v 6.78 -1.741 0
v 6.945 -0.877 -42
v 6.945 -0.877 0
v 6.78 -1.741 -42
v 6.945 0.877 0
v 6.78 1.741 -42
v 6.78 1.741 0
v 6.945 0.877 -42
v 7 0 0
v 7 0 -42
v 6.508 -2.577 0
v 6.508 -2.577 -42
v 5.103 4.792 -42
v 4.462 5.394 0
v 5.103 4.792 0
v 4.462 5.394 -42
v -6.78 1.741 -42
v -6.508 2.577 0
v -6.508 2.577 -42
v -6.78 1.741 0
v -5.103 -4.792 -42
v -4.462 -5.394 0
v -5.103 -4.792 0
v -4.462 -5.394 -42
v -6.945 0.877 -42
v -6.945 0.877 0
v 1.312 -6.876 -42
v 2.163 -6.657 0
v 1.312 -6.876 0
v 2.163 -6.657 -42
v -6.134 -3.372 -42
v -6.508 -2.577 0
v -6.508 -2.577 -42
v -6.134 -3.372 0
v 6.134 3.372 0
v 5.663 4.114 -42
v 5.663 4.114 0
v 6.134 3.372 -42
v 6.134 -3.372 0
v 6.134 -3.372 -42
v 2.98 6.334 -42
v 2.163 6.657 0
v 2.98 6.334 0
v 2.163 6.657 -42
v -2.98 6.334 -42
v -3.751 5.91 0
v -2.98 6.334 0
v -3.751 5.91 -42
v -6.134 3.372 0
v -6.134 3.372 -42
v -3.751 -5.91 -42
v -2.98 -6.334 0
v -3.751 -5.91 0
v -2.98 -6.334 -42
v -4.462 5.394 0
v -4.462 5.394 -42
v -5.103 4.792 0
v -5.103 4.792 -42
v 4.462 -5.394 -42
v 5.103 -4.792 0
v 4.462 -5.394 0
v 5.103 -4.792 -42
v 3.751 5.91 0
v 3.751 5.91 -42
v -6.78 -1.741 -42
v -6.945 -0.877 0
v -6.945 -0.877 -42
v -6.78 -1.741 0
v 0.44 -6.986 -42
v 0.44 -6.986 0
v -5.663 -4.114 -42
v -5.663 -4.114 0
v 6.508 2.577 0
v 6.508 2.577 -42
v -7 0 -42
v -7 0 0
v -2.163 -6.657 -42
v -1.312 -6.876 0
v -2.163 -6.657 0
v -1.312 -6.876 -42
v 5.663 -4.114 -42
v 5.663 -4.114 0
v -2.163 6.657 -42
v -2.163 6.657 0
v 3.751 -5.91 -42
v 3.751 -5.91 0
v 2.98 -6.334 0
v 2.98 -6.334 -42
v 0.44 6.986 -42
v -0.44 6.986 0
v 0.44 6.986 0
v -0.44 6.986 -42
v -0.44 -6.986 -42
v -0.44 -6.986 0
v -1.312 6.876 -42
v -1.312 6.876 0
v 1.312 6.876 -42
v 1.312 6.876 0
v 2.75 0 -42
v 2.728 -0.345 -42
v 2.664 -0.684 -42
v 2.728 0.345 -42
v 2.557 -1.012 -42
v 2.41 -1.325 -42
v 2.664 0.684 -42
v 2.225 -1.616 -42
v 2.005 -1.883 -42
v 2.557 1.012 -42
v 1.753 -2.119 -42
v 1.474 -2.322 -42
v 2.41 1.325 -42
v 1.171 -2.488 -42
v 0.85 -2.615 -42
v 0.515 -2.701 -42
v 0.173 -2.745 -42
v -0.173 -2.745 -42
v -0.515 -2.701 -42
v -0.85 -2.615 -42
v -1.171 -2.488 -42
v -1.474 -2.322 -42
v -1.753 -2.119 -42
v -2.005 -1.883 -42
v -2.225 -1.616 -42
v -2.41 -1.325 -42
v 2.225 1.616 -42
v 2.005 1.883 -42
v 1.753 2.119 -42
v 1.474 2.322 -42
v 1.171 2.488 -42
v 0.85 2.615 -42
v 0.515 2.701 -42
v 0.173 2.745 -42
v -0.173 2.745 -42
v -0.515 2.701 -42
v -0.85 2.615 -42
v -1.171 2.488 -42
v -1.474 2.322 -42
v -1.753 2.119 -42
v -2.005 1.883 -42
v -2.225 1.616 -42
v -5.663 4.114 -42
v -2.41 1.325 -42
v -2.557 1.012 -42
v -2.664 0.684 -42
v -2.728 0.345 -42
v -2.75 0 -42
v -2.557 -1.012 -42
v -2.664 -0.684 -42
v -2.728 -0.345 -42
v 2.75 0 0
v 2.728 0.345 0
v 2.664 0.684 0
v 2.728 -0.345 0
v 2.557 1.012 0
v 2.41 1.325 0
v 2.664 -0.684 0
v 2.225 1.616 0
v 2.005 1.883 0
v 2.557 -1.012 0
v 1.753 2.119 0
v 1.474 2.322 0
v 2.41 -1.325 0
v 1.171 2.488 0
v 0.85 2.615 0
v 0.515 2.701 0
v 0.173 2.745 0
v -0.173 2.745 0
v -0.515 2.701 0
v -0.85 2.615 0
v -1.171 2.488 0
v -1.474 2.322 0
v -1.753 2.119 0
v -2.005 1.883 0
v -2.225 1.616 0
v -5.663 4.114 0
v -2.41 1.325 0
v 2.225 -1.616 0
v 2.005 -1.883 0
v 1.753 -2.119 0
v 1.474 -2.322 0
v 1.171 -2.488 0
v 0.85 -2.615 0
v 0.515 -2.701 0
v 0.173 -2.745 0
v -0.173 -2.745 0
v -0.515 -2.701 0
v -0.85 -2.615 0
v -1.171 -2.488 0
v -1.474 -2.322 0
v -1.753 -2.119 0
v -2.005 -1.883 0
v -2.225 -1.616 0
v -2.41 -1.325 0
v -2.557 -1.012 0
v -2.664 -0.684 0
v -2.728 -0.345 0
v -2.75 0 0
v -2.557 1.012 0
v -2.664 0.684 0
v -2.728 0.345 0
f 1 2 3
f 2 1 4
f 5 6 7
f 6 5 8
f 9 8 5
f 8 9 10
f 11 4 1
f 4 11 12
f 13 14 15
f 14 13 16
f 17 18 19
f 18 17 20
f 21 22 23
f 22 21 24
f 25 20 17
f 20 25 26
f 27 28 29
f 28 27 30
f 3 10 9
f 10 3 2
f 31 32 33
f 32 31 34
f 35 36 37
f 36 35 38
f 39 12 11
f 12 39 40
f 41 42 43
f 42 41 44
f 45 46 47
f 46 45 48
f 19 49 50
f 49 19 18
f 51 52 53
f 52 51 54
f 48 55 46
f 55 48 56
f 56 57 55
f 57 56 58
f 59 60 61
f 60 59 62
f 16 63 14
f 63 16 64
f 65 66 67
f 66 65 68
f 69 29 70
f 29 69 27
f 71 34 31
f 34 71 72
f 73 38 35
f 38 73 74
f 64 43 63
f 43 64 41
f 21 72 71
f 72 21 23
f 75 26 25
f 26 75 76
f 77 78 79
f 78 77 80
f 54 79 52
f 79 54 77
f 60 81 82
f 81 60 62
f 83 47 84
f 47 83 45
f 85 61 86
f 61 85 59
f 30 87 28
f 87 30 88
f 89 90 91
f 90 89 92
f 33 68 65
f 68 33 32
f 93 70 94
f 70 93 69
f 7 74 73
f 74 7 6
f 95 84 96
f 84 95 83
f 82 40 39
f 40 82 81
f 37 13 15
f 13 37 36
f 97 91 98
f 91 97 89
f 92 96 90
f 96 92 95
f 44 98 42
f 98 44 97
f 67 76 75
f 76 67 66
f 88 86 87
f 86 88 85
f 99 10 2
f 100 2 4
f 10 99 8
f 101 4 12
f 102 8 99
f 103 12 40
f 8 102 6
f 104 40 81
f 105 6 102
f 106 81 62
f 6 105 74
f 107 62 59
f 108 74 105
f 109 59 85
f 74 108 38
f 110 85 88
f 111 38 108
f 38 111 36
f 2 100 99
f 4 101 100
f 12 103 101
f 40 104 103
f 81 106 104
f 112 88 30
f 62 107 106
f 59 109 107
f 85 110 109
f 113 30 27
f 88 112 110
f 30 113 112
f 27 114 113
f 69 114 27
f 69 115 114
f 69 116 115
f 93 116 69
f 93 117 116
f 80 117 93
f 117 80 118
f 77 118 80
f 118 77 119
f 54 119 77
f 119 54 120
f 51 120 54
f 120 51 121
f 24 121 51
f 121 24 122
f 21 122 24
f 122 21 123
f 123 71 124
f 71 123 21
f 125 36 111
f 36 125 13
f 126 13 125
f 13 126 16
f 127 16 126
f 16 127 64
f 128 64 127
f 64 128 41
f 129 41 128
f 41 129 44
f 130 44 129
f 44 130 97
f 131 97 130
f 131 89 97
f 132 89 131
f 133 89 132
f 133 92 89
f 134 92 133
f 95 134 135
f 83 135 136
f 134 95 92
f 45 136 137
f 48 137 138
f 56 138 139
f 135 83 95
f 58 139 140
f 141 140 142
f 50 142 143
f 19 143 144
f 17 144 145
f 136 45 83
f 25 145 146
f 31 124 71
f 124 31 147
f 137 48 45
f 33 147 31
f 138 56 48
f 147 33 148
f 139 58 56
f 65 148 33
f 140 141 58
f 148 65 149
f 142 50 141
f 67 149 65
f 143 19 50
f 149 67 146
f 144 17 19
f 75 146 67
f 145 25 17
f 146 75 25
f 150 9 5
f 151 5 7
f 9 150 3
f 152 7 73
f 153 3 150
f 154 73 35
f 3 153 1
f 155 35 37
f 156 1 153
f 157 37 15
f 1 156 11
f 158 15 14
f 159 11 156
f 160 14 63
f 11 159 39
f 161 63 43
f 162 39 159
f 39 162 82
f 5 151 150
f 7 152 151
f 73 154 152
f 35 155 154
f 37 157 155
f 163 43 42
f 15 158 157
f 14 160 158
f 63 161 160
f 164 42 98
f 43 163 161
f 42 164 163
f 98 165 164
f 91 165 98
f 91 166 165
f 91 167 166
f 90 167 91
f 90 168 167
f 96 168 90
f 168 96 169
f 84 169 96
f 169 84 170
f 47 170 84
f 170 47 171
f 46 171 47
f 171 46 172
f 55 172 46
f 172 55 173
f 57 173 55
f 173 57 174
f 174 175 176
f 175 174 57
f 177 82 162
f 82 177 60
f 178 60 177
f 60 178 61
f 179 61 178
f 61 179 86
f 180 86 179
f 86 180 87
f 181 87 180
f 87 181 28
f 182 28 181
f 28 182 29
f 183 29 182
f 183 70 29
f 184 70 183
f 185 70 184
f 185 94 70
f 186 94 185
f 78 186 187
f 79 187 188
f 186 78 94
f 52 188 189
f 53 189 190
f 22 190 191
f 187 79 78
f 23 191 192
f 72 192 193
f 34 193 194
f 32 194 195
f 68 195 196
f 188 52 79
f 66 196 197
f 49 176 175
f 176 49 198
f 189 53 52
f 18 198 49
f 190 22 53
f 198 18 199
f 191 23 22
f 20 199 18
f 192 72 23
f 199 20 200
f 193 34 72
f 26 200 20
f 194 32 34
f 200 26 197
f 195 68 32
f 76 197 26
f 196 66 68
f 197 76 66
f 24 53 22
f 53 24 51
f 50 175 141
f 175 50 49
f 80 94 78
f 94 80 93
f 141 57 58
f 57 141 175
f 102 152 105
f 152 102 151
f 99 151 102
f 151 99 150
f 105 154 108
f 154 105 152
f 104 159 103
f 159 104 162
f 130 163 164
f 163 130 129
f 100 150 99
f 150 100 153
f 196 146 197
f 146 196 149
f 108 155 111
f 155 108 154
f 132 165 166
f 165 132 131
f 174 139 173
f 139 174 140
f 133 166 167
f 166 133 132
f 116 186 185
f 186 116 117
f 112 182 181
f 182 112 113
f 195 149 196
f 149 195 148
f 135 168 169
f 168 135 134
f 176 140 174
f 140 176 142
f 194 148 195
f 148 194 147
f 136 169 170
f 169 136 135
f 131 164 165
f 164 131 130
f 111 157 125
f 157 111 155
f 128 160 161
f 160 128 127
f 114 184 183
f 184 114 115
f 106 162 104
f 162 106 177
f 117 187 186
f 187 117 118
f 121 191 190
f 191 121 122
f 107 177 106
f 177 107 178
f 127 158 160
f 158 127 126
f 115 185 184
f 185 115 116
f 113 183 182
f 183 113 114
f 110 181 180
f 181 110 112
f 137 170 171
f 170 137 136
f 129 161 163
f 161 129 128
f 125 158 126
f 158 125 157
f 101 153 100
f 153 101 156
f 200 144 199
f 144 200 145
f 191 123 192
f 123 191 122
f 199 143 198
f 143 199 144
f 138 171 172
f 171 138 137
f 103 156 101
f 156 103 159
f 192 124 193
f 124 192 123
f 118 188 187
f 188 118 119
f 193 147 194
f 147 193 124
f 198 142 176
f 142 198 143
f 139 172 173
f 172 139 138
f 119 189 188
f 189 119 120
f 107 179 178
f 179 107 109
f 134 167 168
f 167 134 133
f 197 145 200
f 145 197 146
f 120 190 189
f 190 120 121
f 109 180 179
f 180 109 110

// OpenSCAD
$fn = 50;


difference() {
	union() {
		translate(v = [0, 0, -42.0000000000]) {
			cylinder(h = 42, r = 7.0000000000);
		}
		cylinder(h = 0, r = 13.0000000000);
	}
	union() {
		#translate(v = [0, 0, -42]) {
			cylinder(h = 42, r = 2.7500000000);
		}
	}
}
